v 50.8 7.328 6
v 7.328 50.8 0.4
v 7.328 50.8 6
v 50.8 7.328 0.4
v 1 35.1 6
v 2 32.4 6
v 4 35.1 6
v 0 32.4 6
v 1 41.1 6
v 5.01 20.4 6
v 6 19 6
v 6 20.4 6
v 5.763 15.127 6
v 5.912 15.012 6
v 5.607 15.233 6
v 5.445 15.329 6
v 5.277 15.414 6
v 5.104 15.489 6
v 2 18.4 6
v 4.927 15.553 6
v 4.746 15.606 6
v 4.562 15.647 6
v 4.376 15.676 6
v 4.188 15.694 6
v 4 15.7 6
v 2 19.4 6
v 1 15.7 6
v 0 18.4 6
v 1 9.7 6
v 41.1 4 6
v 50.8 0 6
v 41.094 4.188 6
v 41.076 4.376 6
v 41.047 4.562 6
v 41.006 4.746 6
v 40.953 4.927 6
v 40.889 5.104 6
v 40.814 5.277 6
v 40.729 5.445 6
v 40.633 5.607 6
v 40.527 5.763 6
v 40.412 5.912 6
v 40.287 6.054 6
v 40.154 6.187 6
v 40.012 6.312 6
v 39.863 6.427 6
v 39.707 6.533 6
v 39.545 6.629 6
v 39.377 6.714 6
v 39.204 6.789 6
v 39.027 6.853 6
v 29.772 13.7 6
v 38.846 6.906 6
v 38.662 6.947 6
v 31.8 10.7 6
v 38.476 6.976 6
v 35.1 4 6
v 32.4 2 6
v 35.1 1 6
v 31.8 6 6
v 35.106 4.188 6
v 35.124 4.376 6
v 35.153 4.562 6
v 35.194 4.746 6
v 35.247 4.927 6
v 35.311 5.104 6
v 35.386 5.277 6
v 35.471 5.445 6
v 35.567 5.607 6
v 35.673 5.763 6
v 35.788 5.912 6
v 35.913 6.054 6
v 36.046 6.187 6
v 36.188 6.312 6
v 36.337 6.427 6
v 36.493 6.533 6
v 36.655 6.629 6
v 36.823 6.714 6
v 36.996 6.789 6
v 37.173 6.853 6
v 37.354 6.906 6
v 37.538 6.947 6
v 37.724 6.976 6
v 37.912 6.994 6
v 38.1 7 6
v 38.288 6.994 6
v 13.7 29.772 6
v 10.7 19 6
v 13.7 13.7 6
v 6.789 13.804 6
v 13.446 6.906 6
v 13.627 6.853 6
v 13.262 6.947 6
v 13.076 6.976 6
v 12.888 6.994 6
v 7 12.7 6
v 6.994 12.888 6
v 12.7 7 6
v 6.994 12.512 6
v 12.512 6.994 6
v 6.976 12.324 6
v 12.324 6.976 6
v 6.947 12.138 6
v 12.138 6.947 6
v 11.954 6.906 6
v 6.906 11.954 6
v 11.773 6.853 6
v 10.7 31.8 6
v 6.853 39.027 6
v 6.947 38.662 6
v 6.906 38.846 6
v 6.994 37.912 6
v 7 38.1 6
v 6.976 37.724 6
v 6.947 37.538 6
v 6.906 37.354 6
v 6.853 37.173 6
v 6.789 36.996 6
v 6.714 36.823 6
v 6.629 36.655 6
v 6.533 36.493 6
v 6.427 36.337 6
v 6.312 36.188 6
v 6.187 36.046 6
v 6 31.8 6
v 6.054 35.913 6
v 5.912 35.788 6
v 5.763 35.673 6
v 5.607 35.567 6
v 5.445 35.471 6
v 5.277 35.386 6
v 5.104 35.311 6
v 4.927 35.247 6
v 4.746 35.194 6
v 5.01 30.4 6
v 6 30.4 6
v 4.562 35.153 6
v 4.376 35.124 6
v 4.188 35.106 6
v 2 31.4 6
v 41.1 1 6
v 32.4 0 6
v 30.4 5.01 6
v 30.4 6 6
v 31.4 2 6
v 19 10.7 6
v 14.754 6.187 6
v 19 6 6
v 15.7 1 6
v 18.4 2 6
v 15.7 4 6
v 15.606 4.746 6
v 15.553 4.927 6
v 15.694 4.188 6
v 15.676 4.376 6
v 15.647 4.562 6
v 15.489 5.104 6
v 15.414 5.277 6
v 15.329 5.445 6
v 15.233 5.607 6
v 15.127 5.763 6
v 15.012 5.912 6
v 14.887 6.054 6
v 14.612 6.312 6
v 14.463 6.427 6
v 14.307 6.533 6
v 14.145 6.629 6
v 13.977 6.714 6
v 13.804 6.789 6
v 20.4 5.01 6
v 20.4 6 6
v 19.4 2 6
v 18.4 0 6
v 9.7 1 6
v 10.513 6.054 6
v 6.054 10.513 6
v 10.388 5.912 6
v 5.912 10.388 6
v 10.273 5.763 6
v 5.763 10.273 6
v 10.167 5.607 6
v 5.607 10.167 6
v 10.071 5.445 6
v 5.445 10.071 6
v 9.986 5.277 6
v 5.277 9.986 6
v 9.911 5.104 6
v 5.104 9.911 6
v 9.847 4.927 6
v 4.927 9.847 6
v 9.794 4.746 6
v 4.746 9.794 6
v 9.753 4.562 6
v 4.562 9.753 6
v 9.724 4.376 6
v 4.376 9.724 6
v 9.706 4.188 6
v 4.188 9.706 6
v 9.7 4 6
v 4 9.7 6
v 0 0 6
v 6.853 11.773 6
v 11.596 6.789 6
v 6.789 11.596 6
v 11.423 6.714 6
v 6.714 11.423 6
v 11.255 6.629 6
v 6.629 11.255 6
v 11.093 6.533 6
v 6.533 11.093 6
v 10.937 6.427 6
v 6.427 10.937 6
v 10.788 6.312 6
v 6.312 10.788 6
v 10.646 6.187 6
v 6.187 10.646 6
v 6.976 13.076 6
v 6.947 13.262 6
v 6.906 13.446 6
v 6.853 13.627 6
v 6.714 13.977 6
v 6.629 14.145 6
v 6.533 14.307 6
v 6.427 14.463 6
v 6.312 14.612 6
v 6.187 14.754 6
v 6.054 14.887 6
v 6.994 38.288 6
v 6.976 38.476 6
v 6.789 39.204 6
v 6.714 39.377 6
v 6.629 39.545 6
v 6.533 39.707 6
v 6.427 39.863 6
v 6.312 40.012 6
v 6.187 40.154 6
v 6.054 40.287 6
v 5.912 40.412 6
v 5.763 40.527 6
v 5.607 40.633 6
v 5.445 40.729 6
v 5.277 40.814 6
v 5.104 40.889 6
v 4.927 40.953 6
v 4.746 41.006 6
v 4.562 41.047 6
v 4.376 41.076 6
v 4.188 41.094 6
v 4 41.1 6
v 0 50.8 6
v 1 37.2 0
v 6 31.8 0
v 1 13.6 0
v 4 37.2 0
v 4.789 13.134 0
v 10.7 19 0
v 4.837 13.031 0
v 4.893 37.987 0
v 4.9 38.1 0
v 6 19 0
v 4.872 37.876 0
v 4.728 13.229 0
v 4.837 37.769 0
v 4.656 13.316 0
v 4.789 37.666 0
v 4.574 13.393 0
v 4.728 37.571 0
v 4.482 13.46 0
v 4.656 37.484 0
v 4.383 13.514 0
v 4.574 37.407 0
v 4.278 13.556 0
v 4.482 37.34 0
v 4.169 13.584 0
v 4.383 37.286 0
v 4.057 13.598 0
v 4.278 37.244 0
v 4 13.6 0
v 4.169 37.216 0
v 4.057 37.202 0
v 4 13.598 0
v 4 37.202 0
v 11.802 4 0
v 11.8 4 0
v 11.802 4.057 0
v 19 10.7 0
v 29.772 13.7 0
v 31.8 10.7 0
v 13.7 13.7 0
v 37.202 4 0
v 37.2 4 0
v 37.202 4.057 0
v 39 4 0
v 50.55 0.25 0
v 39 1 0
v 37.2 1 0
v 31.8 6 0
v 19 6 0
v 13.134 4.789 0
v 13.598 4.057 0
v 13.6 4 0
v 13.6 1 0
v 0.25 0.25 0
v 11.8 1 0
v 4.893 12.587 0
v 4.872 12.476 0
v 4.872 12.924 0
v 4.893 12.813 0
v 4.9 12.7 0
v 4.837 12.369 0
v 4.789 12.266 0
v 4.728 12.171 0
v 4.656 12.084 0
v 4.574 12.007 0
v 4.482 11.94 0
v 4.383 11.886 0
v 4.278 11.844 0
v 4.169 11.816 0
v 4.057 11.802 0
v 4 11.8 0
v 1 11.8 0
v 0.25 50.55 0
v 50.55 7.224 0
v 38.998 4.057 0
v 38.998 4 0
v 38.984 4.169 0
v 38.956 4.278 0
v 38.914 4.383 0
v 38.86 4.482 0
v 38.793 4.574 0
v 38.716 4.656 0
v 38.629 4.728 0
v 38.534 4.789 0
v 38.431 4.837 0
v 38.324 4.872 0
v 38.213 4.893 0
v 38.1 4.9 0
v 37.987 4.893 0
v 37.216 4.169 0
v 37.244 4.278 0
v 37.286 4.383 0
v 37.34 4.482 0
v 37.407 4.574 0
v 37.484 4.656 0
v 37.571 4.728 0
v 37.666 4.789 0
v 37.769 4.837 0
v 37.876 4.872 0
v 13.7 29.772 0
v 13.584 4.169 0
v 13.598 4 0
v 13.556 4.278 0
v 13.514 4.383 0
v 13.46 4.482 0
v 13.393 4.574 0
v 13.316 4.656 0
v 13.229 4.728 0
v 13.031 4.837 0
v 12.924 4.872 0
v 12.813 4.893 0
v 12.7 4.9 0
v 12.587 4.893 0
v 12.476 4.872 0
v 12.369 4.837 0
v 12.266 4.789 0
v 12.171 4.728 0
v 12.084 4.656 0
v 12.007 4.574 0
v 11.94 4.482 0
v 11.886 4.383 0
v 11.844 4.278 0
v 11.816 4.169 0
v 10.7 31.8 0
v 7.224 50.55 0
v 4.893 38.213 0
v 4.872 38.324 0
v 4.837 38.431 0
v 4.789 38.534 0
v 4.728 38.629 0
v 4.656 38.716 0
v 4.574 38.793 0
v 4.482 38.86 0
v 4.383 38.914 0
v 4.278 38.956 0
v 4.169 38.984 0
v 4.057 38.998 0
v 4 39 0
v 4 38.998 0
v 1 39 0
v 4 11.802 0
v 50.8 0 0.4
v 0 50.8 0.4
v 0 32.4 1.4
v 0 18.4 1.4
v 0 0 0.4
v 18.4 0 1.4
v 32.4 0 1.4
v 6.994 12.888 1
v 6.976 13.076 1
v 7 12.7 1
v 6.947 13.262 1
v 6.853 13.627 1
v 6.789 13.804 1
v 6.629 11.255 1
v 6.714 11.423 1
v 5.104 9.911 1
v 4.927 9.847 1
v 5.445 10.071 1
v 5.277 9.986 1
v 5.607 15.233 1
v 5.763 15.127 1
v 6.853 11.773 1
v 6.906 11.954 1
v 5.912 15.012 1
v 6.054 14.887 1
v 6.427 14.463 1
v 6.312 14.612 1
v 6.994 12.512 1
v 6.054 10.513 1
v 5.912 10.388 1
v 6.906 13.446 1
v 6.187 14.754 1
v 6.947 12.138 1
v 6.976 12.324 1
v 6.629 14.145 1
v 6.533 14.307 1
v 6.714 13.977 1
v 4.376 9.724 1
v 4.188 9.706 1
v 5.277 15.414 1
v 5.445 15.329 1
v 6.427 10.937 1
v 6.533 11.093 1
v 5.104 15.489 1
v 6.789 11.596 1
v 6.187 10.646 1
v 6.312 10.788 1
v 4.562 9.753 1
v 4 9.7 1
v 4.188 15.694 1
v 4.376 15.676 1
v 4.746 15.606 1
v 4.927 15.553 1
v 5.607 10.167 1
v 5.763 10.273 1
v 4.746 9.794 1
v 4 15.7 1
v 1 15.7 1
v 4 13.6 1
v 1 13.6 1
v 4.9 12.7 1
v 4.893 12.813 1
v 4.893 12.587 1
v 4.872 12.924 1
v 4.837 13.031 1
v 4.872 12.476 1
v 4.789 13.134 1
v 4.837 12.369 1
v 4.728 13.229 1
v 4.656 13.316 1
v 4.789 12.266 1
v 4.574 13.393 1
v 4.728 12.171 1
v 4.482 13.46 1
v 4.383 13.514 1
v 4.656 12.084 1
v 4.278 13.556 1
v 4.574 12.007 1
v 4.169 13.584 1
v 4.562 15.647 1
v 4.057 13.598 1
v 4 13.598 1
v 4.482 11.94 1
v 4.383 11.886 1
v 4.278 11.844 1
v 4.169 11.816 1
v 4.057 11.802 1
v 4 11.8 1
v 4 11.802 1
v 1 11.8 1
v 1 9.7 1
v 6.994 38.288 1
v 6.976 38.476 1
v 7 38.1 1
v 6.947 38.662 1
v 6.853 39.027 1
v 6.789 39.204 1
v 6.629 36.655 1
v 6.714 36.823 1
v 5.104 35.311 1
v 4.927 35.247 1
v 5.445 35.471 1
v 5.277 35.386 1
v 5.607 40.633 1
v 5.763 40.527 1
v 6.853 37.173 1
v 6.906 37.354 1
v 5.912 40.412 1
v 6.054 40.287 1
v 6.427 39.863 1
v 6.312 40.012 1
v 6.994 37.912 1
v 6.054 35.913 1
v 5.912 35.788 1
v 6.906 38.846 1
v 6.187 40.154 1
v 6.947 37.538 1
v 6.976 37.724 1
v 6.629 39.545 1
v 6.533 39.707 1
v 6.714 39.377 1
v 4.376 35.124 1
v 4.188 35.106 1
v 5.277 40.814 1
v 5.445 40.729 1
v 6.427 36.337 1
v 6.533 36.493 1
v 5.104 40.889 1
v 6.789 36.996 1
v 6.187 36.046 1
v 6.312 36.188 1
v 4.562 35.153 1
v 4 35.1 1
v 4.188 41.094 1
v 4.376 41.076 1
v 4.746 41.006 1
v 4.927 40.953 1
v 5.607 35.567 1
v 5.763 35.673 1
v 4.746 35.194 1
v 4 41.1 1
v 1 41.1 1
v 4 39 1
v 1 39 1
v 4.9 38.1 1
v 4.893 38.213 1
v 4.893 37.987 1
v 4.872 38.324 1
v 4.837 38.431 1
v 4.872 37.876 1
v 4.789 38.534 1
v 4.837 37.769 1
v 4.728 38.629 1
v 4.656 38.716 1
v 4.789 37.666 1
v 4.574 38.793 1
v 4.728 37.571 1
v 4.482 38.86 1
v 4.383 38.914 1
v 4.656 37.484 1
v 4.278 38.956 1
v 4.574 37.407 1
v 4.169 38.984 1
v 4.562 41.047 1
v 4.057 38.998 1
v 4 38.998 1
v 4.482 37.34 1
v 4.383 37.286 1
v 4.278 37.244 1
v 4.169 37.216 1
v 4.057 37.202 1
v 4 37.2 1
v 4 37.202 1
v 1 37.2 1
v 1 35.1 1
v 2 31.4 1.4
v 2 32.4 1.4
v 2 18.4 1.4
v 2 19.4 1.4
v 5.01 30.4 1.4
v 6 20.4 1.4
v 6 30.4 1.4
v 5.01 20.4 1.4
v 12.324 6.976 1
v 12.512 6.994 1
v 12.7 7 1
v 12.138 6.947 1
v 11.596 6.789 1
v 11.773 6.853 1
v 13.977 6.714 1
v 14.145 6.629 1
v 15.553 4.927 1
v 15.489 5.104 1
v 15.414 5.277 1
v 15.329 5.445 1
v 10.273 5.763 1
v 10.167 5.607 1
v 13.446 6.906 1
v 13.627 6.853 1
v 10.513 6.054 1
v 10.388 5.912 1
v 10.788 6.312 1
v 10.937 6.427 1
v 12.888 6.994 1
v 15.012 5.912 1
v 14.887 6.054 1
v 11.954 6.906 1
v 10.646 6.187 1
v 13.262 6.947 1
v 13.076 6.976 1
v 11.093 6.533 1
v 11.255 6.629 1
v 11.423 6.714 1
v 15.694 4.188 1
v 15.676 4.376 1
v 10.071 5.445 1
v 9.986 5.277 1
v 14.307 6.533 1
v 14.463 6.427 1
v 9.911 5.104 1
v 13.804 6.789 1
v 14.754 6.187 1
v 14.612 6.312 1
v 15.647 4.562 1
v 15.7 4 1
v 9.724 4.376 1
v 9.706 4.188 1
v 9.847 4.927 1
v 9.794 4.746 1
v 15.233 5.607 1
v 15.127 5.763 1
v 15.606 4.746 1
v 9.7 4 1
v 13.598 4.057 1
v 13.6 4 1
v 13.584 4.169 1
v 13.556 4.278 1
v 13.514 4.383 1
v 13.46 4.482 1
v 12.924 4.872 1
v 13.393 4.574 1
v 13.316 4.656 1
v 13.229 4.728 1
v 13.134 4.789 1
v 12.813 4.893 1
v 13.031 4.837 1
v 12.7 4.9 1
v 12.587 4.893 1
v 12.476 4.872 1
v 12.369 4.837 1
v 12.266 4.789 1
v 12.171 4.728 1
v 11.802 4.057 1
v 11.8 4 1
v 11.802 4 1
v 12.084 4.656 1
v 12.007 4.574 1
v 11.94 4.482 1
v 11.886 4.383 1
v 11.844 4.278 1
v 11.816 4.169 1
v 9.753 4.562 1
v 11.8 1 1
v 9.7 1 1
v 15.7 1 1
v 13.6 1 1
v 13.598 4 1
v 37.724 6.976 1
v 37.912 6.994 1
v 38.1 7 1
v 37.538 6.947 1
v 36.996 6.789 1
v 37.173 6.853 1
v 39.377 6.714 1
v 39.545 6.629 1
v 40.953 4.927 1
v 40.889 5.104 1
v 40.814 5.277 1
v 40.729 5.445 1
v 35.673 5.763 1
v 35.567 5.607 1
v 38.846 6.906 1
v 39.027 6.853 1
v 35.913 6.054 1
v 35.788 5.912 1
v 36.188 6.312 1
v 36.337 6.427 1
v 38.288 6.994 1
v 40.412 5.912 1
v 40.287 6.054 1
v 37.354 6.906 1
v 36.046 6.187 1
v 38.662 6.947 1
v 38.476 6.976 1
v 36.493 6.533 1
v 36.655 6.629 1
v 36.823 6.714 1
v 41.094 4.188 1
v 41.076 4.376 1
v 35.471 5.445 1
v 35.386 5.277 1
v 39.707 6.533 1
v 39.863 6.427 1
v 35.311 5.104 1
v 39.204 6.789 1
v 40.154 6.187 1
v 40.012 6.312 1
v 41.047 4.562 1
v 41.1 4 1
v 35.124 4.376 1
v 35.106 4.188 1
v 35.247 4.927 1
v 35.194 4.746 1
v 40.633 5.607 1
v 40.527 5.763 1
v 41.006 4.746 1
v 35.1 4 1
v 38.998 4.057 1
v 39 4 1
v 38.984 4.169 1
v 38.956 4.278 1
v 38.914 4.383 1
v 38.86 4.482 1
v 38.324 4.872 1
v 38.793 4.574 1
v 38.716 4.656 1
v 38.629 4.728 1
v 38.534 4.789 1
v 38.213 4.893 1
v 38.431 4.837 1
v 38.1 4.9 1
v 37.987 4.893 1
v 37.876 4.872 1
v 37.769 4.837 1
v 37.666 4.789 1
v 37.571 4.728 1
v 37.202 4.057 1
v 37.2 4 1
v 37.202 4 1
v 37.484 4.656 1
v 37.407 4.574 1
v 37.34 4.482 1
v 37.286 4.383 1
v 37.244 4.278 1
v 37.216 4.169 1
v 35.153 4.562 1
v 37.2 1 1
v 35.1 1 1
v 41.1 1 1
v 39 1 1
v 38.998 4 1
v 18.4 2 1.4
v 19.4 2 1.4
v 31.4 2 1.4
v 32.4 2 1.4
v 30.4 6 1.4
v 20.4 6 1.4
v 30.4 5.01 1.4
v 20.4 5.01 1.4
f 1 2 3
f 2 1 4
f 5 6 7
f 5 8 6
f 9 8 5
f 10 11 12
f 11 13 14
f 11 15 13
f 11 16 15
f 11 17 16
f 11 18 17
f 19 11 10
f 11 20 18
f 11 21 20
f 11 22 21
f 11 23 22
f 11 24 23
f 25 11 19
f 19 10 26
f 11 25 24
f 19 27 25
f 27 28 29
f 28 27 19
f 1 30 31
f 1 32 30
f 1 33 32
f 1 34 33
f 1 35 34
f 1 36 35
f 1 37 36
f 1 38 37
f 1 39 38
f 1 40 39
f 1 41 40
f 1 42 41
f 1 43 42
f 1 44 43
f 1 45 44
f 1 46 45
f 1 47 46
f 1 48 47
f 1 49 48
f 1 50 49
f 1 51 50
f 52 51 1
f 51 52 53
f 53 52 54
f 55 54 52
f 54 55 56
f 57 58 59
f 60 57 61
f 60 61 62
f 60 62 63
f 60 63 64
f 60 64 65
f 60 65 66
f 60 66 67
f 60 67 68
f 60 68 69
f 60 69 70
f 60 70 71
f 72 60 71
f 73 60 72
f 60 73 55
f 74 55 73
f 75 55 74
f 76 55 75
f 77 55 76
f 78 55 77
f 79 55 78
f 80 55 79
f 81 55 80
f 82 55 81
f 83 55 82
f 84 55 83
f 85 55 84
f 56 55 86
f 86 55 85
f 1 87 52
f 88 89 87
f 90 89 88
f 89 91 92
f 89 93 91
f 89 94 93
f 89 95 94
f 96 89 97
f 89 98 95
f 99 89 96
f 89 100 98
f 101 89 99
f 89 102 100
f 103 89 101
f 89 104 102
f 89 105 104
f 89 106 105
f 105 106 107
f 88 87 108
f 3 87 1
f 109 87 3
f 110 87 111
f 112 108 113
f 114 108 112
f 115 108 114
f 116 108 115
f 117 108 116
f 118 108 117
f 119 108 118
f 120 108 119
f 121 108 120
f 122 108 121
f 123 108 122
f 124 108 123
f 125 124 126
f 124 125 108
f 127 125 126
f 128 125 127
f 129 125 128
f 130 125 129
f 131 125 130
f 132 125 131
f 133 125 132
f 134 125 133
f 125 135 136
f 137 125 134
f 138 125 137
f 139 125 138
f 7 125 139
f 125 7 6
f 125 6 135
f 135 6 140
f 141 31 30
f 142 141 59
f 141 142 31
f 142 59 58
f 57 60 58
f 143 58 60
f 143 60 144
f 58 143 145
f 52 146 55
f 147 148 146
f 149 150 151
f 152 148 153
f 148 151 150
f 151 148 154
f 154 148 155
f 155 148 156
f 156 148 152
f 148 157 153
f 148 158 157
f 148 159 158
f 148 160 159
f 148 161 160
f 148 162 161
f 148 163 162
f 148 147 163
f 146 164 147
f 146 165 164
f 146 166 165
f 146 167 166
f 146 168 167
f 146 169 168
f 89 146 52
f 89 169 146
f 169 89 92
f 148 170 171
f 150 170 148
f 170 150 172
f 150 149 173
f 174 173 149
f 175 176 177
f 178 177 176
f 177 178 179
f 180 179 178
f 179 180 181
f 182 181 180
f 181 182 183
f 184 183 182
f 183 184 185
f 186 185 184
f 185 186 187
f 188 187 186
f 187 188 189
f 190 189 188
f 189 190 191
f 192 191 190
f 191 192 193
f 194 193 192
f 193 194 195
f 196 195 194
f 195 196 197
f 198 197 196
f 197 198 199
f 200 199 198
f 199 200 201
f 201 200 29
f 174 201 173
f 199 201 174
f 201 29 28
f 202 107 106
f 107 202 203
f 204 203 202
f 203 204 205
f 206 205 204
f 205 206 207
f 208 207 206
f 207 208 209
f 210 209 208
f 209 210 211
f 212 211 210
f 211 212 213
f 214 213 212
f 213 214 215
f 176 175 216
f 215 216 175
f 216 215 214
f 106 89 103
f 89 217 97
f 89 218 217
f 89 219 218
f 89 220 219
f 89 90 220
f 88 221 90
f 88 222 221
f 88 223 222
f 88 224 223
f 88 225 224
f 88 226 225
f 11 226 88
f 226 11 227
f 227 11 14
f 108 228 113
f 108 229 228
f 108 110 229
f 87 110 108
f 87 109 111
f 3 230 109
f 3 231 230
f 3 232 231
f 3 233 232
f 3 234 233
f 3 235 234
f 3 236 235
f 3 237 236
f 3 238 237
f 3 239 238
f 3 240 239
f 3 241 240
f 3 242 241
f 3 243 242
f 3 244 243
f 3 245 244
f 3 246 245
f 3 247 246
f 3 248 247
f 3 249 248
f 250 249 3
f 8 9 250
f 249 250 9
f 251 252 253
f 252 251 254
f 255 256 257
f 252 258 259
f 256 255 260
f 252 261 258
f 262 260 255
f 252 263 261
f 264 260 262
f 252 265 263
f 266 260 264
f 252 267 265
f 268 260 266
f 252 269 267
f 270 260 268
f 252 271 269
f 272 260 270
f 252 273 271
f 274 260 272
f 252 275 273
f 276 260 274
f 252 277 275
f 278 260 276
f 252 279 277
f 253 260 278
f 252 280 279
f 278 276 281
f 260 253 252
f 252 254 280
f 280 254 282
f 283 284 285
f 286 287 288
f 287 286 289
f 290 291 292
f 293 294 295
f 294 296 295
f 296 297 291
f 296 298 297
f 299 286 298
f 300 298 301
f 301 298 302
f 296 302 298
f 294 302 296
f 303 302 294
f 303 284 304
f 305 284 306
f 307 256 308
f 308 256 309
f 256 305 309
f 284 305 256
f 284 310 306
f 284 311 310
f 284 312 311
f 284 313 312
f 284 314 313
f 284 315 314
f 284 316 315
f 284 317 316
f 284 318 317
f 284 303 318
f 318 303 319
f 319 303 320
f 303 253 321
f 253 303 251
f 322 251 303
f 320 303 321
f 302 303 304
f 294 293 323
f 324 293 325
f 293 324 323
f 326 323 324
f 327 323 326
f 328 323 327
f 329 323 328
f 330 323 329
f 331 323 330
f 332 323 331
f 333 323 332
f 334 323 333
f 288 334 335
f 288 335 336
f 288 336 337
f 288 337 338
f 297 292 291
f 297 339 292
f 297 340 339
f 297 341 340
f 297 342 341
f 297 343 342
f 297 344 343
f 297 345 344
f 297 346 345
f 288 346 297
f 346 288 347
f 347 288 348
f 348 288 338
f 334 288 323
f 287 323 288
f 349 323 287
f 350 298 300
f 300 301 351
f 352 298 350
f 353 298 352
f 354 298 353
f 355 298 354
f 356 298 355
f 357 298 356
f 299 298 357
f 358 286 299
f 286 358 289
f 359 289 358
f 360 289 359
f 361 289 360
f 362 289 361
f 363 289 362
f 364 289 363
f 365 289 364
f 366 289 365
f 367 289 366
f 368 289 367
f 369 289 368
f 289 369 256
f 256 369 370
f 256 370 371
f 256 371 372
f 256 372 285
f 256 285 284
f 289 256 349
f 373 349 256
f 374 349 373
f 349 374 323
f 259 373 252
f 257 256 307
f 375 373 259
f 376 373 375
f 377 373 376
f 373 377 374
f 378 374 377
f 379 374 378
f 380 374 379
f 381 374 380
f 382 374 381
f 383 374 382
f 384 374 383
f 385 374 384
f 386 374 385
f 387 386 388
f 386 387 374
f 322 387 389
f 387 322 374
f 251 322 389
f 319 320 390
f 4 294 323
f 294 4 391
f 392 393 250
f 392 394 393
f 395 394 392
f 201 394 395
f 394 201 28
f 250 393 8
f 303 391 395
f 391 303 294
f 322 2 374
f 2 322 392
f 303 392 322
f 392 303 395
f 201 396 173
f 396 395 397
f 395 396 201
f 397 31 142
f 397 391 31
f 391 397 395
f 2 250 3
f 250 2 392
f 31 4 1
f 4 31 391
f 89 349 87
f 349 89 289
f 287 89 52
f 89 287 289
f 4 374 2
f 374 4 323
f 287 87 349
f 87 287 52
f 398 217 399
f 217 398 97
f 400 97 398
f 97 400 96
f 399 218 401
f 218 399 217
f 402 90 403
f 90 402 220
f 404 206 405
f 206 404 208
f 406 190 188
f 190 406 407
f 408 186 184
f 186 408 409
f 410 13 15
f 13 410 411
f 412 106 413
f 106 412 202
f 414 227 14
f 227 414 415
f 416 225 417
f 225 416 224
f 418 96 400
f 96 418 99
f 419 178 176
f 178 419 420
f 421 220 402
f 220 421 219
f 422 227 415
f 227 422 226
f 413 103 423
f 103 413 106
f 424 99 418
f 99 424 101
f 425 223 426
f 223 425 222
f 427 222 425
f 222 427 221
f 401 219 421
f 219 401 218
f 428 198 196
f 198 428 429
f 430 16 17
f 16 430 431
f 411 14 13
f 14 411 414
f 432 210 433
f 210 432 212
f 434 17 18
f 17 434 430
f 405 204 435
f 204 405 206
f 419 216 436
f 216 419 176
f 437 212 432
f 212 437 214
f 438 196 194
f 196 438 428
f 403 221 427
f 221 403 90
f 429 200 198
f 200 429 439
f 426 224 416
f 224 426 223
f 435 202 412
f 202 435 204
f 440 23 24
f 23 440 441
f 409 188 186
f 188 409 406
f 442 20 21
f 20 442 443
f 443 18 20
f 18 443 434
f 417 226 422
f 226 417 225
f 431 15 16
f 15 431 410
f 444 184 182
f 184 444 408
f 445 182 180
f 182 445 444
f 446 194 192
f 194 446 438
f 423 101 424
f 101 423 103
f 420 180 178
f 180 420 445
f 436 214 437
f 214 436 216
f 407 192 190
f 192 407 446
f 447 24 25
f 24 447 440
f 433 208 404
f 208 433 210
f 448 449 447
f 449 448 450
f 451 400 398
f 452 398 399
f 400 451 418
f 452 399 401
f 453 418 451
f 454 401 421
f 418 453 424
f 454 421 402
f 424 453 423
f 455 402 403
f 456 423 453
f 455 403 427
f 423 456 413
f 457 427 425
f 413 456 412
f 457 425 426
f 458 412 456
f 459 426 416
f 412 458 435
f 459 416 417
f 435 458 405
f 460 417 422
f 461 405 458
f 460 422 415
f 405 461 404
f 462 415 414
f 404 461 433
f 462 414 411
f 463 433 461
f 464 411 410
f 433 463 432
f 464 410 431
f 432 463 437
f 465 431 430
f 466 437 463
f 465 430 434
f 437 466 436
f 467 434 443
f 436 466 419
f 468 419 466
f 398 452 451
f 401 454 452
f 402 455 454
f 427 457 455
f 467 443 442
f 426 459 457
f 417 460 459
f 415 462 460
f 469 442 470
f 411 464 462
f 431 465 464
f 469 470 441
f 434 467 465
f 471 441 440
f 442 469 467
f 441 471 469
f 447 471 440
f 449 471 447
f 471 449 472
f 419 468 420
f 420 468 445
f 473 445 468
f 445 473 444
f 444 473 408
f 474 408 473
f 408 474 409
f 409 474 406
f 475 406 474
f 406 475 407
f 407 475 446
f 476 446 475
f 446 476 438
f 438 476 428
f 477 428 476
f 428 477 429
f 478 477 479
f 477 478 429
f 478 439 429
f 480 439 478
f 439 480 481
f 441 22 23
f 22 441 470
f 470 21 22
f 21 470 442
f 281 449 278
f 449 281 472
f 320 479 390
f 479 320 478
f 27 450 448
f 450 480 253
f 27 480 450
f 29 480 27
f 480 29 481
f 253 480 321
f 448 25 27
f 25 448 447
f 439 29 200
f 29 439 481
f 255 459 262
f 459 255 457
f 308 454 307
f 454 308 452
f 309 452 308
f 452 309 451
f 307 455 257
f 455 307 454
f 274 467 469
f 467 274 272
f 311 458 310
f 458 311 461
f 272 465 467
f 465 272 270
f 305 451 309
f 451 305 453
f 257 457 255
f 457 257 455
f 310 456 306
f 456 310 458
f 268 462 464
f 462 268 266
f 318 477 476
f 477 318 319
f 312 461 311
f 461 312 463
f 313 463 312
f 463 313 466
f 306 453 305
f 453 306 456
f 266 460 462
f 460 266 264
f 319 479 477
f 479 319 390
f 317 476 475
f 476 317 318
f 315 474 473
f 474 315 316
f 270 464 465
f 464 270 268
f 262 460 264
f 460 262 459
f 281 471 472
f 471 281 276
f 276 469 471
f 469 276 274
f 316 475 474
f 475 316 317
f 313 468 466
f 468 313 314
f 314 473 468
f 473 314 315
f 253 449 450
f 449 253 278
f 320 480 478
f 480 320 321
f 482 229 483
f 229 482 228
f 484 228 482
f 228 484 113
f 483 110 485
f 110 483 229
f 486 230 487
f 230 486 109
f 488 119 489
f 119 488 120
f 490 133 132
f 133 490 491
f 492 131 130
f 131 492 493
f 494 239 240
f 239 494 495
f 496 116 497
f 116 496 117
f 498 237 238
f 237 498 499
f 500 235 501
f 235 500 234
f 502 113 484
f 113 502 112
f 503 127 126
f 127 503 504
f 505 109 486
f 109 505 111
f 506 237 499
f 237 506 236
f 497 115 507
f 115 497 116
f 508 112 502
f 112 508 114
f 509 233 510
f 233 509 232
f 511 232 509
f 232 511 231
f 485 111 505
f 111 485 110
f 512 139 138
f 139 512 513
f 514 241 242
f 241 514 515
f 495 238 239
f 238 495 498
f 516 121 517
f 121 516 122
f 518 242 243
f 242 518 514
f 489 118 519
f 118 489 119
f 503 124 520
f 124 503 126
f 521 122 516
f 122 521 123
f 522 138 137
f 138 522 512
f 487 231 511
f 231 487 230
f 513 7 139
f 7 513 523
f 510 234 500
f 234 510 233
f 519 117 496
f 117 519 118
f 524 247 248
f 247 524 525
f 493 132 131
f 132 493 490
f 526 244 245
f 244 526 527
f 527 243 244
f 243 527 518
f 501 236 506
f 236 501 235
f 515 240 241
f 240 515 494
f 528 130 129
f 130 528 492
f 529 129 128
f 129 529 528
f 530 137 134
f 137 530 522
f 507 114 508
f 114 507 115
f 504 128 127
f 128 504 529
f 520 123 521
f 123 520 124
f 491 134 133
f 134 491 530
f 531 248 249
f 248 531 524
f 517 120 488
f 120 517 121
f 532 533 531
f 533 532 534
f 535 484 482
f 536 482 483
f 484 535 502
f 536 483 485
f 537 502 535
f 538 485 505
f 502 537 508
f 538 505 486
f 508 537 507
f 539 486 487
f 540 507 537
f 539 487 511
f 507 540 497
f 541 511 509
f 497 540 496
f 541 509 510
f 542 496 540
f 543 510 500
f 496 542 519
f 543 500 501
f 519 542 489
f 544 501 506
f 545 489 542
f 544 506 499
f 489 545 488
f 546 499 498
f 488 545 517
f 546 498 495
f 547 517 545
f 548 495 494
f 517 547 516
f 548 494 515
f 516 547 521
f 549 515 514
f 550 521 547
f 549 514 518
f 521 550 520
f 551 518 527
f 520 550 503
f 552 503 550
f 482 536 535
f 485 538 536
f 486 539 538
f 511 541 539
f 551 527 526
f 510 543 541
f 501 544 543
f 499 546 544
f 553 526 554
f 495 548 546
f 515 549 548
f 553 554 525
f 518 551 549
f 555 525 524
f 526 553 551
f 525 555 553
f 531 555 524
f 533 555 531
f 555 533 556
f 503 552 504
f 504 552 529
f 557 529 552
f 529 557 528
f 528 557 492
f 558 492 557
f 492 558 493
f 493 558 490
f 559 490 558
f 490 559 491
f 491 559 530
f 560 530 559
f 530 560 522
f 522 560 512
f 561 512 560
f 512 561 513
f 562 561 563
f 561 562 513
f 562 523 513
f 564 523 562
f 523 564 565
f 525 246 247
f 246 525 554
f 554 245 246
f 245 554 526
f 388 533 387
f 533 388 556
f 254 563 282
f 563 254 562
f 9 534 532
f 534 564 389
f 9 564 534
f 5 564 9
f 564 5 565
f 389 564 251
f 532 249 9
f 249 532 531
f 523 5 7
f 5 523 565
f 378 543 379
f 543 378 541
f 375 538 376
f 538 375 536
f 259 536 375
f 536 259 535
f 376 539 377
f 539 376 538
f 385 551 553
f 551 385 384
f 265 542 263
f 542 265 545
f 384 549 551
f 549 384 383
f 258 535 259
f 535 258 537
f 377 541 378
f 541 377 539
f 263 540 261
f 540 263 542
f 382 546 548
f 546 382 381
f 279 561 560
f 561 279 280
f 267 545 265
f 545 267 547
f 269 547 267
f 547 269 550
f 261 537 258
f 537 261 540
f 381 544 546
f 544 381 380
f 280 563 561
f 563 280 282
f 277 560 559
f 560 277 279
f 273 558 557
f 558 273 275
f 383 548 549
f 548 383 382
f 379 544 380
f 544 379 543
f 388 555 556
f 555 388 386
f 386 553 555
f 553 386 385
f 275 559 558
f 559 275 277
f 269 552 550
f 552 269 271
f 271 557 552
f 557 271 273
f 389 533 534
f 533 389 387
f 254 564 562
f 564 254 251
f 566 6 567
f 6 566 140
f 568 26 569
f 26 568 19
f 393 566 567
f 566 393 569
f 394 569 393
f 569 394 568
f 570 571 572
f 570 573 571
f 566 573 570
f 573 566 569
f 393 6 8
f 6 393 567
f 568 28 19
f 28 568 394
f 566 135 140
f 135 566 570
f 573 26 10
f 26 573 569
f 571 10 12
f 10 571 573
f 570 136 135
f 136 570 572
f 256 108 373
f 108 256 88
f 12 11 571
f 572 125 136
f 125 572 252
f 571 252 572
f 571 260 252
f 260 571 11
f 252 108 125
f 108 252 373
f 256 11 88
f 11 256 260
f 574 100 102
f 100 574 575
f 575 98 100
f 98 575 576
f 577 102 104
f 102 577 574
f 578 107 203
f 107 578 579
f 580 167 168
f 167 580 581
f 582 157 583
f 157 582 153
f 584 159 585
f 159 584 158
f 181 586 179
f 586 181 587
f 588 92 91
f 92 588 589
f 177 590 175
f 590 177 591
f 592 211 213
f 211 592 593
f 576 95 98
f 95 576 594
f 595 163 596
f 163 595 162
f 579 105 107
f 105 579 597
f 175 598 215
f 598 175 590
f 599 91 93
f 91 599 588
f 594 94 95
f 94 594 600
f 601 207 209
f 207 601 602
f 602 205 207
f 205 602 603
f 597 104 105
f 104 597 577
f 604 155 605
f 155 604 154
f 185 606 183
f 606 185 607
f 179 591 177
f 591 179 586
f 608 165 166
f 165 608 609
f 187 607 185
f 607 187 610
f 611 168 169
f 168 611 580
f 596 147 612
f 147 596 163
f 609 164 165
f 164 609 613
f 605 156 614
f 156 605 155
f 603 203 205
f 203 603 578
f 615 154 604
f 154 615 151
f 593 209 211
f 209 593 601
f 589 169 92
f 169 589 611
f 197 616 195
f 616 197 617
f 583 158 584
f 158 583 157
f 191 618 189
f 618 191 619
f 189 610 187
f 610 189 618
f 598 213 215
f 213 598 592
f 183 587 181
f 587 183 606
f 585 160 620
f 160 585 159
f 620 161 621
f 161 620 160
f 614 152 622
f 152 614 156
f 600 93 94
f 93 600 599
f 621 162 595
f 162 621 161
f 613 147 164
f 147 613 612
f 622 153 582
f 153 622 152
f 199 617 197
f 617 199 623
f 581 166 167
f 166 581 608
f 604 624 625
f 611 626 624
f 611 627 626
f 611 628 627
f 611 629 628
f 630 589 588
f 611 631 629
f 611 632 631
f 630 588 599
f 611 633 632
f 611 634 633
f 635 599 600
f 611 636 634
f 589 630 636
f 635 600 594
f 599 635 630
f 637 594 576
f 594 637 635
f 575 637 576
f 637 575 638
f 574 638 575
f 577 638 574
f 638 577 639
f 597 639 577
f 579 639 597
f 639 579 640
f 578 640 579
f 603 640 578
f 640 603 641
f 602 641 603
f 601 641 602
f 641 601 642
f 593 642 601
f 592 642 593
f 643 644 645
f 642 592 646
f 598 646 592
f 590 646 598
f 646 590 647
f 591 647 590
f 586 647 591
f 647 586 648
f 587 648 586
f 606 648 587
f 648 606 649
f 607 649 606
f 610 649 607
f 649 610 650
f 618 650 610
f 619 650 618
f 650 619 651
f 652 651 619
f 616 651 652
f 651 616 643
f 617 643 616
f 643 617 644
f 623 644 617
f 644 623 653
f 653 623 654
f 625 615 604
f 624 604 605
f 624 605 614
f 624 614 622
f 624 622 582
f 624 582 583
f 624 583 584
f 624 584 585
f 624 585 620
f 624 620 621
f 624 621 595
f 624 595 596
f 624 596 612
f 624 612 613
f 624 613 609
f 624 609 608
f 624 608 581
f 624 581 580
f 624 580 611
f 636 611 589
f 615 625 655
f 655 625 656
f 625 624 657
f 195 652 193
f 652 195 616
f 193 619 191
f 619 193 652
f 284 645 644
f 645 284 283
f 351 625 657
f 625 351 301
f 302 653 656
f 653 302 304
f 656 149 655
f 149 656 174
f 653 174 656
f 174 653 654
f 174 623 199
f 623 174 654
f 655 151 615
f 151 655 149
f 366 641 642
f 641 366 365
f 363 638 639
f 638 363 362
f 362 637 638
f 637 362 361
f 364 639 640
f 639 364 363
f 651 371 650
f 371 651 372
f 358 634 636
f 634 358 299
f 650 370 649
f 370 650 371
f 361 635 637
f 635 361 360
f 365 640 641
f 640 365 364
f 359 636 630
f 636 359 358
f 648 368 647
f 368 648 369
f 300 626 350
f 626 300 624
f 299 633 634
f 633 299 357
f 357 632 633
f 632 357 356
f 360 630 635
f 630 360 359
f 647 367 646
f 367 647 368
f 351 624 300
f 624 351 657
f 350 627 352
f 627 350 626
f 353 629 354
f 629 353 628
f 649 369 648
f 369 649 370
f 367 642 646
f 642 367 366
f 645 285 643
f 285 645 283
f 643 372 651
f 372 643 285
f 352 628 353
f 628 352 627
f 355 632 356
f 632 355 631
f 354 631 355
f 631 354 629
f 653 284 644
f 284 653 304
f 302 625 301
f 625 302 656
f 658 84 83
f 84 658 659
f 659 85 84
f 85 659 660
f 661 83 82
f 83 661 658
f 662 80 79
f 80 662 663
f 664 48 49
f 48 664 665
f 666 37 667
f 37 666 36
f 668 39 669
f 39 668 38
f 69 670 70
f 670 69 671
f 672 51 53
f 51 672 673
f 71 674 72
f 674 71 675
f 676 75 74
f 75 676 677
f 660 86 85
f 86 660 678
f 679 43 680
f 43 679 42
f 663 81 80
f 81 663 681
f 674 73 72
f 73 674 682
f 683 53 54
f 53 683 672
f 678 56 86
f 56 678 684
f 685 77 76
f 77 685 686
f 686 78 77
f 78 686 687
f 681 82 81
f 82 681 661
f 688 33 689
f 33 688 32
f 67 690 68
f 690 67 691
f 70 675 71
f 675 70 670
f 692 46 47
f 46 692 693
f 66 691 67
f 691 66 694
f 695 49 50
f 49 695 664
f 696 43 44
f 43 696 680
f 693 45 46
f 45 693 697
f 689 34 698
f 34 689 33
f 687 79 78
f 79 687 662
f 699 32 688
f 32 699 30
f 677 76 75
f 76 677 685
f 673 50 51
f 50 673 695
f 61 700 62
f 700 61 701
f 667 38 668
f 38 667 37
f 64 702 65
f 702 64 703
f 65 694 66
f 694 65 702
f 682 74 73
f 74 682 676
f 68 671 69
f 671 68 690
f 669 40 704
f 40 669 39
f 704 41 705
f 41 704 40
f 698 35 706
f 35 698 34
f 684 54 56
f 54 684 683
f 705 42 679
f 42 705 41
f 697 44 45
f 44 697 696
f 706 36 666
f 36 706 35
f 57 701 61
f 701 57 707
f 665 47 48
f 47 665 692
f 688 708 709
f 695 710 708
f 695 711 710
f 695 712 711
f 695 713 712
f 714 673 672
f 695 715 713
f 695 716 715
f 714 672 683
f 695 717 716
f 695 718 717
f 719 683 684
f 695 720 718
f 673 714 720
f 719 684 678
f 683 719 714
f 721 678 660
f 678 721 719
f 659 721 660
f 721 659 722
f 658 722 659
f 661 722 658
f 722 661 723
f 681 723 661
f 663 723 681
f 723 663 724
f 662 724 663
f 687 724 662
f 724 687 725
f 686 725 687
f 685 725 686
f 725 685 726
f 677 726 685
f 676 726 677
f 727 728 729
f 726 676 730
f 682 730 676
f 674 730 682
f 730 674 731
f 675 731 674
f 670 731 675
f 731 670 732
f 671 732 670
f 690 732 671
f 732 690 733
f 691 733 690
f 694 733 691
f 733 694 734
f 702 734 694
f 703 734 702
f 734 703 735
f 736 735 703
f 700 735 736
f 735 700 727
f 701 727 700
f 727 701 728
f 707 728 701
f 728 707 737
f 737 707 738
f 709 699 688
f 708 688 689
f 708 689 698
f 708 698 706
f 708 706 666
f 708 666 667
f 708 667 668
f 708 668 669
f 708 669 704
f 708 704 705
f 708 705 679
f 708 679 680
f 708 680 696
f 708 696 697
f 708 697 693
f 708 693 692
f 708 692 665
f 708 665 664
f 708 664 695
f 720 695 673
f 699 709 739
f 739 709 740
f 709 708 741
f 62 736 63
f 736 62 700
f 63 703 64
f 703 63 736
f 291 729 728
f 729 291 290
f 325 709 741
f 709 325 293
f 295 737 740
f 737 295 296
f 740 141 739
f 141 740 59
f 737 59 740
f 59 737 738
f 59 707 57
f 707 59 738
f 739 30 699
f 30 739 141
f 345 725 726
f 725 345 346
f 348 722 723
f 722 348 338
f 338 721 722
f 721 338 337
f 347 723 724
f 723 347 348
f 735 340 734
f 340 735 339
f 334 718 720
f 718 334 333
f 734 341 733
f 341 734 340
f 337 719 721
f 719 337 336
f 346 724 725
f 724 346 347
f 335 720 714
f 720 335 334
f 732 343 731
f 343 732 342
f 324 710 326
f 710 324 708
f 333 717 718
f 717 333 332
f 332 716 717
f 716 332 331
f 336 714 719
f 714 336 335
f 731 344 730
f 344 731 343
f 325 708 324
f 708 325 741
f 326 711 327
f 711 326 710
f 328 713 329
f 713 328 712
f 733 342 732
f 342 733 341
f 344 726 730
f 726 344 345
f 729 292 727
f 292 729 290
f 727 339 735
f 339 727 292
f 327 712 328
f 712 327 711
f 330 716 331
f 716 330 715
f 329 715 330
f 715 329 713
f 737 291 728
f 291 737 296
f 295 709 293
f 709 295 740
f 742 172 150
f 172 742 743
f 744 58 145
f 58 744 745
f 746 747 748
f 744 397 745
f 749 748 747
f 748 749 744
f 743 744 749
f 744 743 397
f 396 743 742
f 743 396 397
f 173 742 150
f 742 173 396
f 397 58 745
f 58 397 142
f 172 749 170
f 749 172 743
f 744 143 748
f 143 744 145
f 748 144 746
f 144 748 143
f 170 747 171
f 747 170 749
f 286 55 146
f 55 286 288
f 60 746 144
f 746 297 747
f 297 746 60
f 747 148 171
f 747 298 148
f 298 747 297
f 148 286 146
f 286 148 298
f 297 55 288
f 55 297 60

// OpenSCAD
// file: lock_flex_magnetic.scad
/*
 * Flex Magnet
 */
module flex_magnetic_positive(magnet_hole=6, height=6) {
    if (magnet_hole > 0) {
        translate([magnet_hole/2+1,0,0]) cylinder(.41,magnet_hole/2+1-.25,magnet_hole/2+1, $fn=100);
        translate([magnet_hole/2+1,0,0.4]) cylinder(height-.4,magnet_hole/2+1,magnet_hole/2+1, $fn=100);
        hull() {
            translate([0.25,-magnet_hole/2-1+.25,0]) cube([magnet_hole/2+1-.25,magnet_hole+2-.5,1]);
            translate([0,-magnet_hole/2-1,.4]) cube([magnet_hole/2+1,magnet_hole+2,height-.4]);
        }
    }
}

module flex_magnetic_negative(magnet_hole=6, height=6) {
    if (magnet_hole > 0) {
        translate([magnet_hole/2+1,0,1]) cylinder(height+2,magnet_hole/2,magnet_hole/2, $fn=100);
        translate([1,-magnet_hole/2,1]) cube([magnet_hole/2,magnet_hole,height+2]);
        translate([magnet_hole/2+1,0,-1]) cylinder(10,.9,.9,$fn=50);
        translate([1,-.9,-1]) cube([magnet_hole/2,.9*2,10]);
    }
}

module flex_magnetic_hex(square_basis, magnet_hole=6, height=6) {
    if (magnet_hole > 0) {
        hull() {
            translate([square_basis/2,0,0]) rotate([0,0,90]) translate([magnet_hole/2+1,0,1]) cylinder(height+2,magnet_hole/2,magnet_hole/2, $fn=100);
            rotate([0,0,-120]) mirror([1,0,0]) translate([square_basis/2,0,0]) rotate([0,0,90]) translate([magnet_hole/2+1,0,1]) cylinder(height+2,magnet_hole/2,magnet_hole/2, $fn=100);
        }
        translate([square_basis/2,0,0]) rotate([0,0,90]) union() {
            //translate([magnet_hole/2+1,0,1]) cylinder(8,magnet_hole/2,magnet_hole/2, $fn=100);
            translate([1,-magnet_hole/2,1]) cube([magnet_hole/2,magnet_hole,height+2]);
            translate([magnet_hole/2+1,0,-1]) cylinder(10,.9,.9,$fn=50);
            translate([1,-.9,-1]) cube([magnet_hole/2,.9*2,10]);
        }
        rotate([0,0,-120]) mirror([1,0,0]) translate([square_basis/2,0,0]) rotate([0,0,90]) union() {
            //translate([magnet_hole/2+1,0,1]) cylinder(8,magnet_hole/2,magnet_hole/2, $fn=100);
            translate([1,-magnet_hole/2,1]) cube([magnet_hole/2,magnet_hole,height+2]);
            translate([magnet_hole/2+1,0,-1]) cylinder(10,.9,.9,$fn=50);
            translate([1,-.9,-1]) cube([magnet_hole/2,.9*2,10]);
        }
    }
}
// file: lock_magnetic.scad
/*
 * Magnets
 */
 
module magnetic_positive(magnet_hole=6, height=6) {
    if (magnet_hole > 0) {
        translate([magnet_hole/2+1,0,0]) cylinder(.41,magnet_hole/2+1-.25,magnet_hole/2+1, $fn=100);
        translate([magnet_hole/2+1,0,0.4]) cylinder(height-.4,magnet_hole/2+1,magnet_hole/2+1, $fn=100);
    }
}

module magnetic_negative(magnet_hole=6, height=8) {
    if (magnet_hole > 0) {
        translate([magnet_hole/2+1,0,1]) cylinder(height+2,magnet_hole/2,magnet_hole/2, $fn=100);
        translate([magnet_hole/2+1,0,-1]) cylinder(10,.9,.9,$fn=50);
    }
}
// file: lock_openlock_topless.scad
/*
 * Openlock Topless connection bay
 */

module openlock_topless_chamber(buffer=0, height=6) {
    translate([-buffer,-7,1.4]) cube([2+buffer,7*2,height+1]);
    hull() {
        translate([0,-6,1.4]) cube([2,6*2,height+1]);
        translate([3+0.01,-5,1.4]) cube([2,5*2,height+1]);
    }
    hull() {
        translate([5,-5,1.4]) cube([1,5*2,height+1]);
        translate([6,-5,1.4]) cube([1,5*2,height+1]);
    }
    translate([6,-6.4,-1]) cube([4.7,6.4*2,height+3.4]);
}

module openlock_topless_positive(height=6) {
    translate([0,-8,0.4]) cube([2,16,height-.4]); 
}

module openlock_topless_negative(supports=true, height=6) {
    difference() {
        openlock_topless_chamber(1, height=height);
    }
}
// file: lock_openlock.scad
/*
 * Openlock connection bay
 */

module openlock_chamber(buffer=0) {
    add = TOPLESS == "true" ? 10 : 0;
    translate([-buffer,-7,1.4]) cube([2+buffer,7*2,4.2+add]);
    hull() {
        translate([0,-6,1.4]) cube([2,6*2,4.2+add]);
        translate([3+0.01,-5,1.4]) cube([2,5*2,4.2+add]);
    }
    hull() {
        translate([5,-5,1.4]) cube([1,5*2,4.2+add]);
        translate([6,-5,1.4]) cube([1,5*2,4.7]);
    }
    translate([6,-6.4,-1]) cube([4.7,6.4*2,7.1]);
}

module openlock_supports() {
    module support() {
        translate([-1.1,2.05,1.2]) cube([3.1,1,4.6]);
        hull() {
            translate([-1.1,2.05,1.4]) cube([3.1,1,2.1]);
            translate([-1.1,2.05-.2,1.9]) cube([3.1,1.4,1.1]);
        }
        hull() {
            translate([-1.1,2.05,3.5]) cube([3.1,1,2.1]);
            translate([-1.1,2.05-.2,4.0]) cube([3.1,1.4,1.1]);
        }
    }
    if (TOPLESS != "true") {
        support();
        mirror([0,1,0]) support();
    }
}

module openlock_positive() {
    translate([0,-8,0.4]) cube([2,16,5.6]); 
}

module openlock_negative(supports=true) {
    difference() {
        openlock_chamber(1);
        if(supports) {
            openlock_supports();
        }
    }
}

module openlock_wall_negative(supports=true) {
    translate([0,0,0]) difference() {
        translate([0,0,1.4]) linear_extrude(height=4.2) {
            polygon([
                [-7.35,7],[-5.35,7],[-5.35,6],
                [-2.35,5],[2.35,5],
                [5.35,6],[5.35,7],[7.35,7],
                [7.35,-7],[5.35,-7],[5.35,-6],
                [2.35,-5],[-2.35,-5],
                [-5.35,-6],[-5.35,-7],[-7.35,-7]]);
        }
        if(supports) {
            translate([-6.35,0,0]) openlock_supports();
            rotate([0,0,180]) translate([-6.35,0,0]) openlock_supports();
        }
    }
}

module openlock_wall_positive() {
    translate([-6.35,-8,0.4]) cube([12.7,16,5.6]); 
}

module openlock_sidelock_negative() {
    
    translate([0,0,7]) rotate([90,0,0]) translate([0,0,-2.1]) linear_extrude(height=4.2) {
        polygon([[-1,-7],[-1,7],[2,7],[2,6],[5,5],[5.9,5],[5.9,5.26],[5.9+4.53,5.26],
            [5.9+4.53,-5.26],[5.9,-5.26],[5.9,-5],[5,-5],[2,-6],[2,-7]]);
    }
}

module openlock_sidelock_positive() {
    translate([0,-3.1,-8]) cube([11.43,6.2,16]);
}
// file: lock_infinitylock.scad
/*
 * Infinity Lock connection bay
 */
module infinitylock_positive() {
    translate([0,-6.6,0.4]) cube([2,6.6*2,5.6]); 
}

module infinitylock_negative() {
    translate([-1,-5.6,1.4]) cube([2.6,5.6*2,4.2]);

    hull() {
        translate([0,-3.83,1.4]) cube([1.6,3.83*2,4.2]);
        translate([0,-3.36,1.4]) cube([2.15,3.36*2,4.2]);
    }
    translate([0,-3.36,1.4]) cube([2.8,3.36*2,4.2]);
    hull() {
        translate([2.7,-3.36,1.4]) cube([2.7,3.36*2,4.2]);
        translate([3.84,-3.83,1.4]) cube([1,3.83*2,4.2]);
    }
    translate([4.8,-3.83,-1]) cube([3.44,3.83*2,6.6]);
}
// file: lock_dragonlock.scad
/*
 * Dragonlock connection bay
 */

module dragonlock_interior_a(north=true,south=true,east=true,west=true) {
    module edge() {
        difference() {
            hull() {
                translate([3.17,-12.67,-1]) cube([8.512,12.67*2,6]);
                translate([3.145,-12.7,-1]) cube([8.512,12.67*2,6.206]);
            }
            translate([10.29,-12.8,5.206]) rotate([0,45,0]) cube([8.512,12.8*2,6.206]);
        }
    }
    
    translate([0,25.4,0]) {
        difference() {
            translate([12.7,-12.7,-1]) cube([50.8-12.7*2,50.8-12.7*2,6.206]);
            translate([25.4,0,0]) rotate([0,0,45]) translate([-.75,-30,-2]) cube([1.5,60,20]);
            translate([25.4,0,0]) rotate([0,0,-45]) translate([-.75,-30,-2]) cube([1.5,60,20]);
        }

        if (!west) {
            edge();
        }
        if (!south) {
            translate([25.4,-25.4,0]) rotate([0,0,90]) edge();
        }
        if (!east) {
            translate([50.8,0,0]) rotate([0,0,180]) edge();
        }
        if (!north) {
            translate([25.4,25.4,0]) rotate([0,0,270]) edge();
        }
        dragonlock_nub();
        translate([25.4,-25.4,0]) rotate([0,0,90]) dragonlock_nub();
        translate([50.8,0,0]) rotate([0,0,180]) dragonlock_nub();
        translate([25.4,25.4,0]) rotate([0,0,270]) dragonlock_nub();
    }
}

module dragonlock_interior_b(north=true,south=true,east=true,west=true) {
    translate([0,25.4,0]) {
        if (west) {
            dragonlock_negative();
        }
        if (south) {
            translate([25.4,-25.4,0]) rotate([0,0,90]) dragonlock_negative();
        }
        if (east) {
            translate([50.8,0,0]) rotate([0,0,180]) dragonlock_negative();
        }
        if (north) {
            translate([25.4,25.4,0]) rotate([0,0,270]) dragonlock_negative();
        }
    }
}


module dragonlock_positive() {
    translate([0,-7.8418,0.4]) cube([2,7.8418*2,5.6]);
}

module dragonlock_negative(supports=true) {
    difference() {
        union() {
            translate([-1,-6.8418,1.3695]) cube([5.1,6.8418*2,3.225]);
            hull() {
                translate([3.17,-7.62,-1]) cube([7.9634,7.62*2,4.81]);
                translate([3.17,-7.62,-1]) cube([7.735,7.62*2,5.5945]);
            }
        }
        if(supports) {
            translate([-1.1,-.25,0]) cube([4.262,.5,5]);
            translate([-1.1,3.59-.25,0]) cube([7.1,.5,5]);
            translate([-1.1,-3.59-.25,0]) cube([7.1,.5,5]);
        }
        translate([3,-3.9095,-1.1]) cube([10,3.9095*2,2.4695]);
        translate([3,-4.7685,-1.1]) rotate([0,0,39.15]) cube([5,5,2.4695]);
        mirror([0,1,0]) translate([3,-4.7685,-1.1]) rotate([0,0,39.15]) cube([5,5,2.4695]);
        translate([7,-2.12,-1]) cube([5,2.12*2,10]);
        translate([8.069,0,-1]) cylinder(10,2.815,2.811,$fn=50);

        difference() {
            translate([8.069,0,-1.1]) cylinder(2.4695,4.62,4.62,$fn=50);
            translate([3,-5,-1.2]) cube([10,10,1.2]);
        }
    }
}
// file: impl_square.scad
include <connectors.scad>

/*
 * Connector Positive
 */
module connector_positive_square(x,y,square_basis,edge_width,north=true,south=true,east=true,west=true) {
    for ( i = [0 : y-1] ) {
        if(west) {
            translate([0,square_basis*(i+1)-square_basis/2,0]) center_connector_positive(y);
        }
        if(east) {
            translate([square_basis*x,square_basis*(i+1)-square_basis/2,0]) rotate([0,0,180]) center_connector_positive(y);
        }
    }
    if (y > 1) {
        for ( i = [1 : y-1] ) {
            if(west) {
                translate([0,square_basis*i,0]) joint_connector_positive(y);
            }
            if(east) {
                translate([square_basis*x,square_basis*i,0]) rotate([0,0,180]) joint_connector_positive(y);
            }
        }
    }
    for ( i = [0 : x-1] ) {
        if(south) {
            translate([square_basis*(i+1)-square_basis/2,0,0]) rotate([0,0,90]) center_connector_positive(x);
        }
        if(north) {
            translate([square_basis*(i+1)-square_basis/2,square_basis*y,0]) rotate([0,0,-90]) center_connector_positive(x);
        }
    }
    if (x > 1) {
        for ( i = [1 : x-1] ) {
            if(south) {
                translate([square_basis*i,0,0]) rotate([0,0,90]) joint_connector_positive(y);
            }
            if(north) {
                translate([square_basis*i,square_basis*y,0]) rotate([0,0,-90]) joint_connector_positive(y);
            }
        }
    }
}

module connector_positive_square_notch(x,y,square_basis,edge_width,north=true,south=true,east=true,west=true) {
    if(NOTCH == "true") {
        connector_positive_square(x,y,square_basis,edge_width,north=north,south=false,east=east,west=false);
        if(south) {
            translate([square_basis*NOTCH_X,0,0]) connector_positive_square(x-NOTCH_X,y-NOTCH_Y,square_basis,edge_width,north=false,south=true,east=false,west=false);
            translate([0,square_basis*NOTCH_Y,0]) connector_positive_square(NOTCH_X,NOTCH_Y,square_basis,edge_width,north=false,south=true,east=false,west=false);
        }
        if(west) {
            translate([square_basis*NOTCH_X,0,0]) connector_positive_square(NOTCH_X,NOTCH_Y,square_basis,edge_width,north=false,south=false,east=false,west=true);
            translate([0,square_basis*NOTCH_Y,0]) connector_positive_square(x-NOTCH_X,y-NOTCH_Y,square_basis,edge_width,north=false,south=false,east=false,west=true);
        }
    } else {
        connector_positive_square(x,y,square_basis,edge_width,north,south,east,west);
    }
}

/*
 * Connector Negative
 */
module connector_negative_square(x,y,square_basis,edge_width,north=true,south=true,east=true,west=true, priority=PRIORITY, lock=LOCK, magnets=MAGNETS, magnet_hole=MAGNET_HOLE, height=HEIGHT) {
    for ( i = [0 : y-1] ) {
        if(west) {
            translate([0,square_basis*(i+1)-square_basis/2,0]) center_connector_negative(y, priority, lock, magnets, magnet_hole, height=height);
        }
        if(east) {
            translate([square_basis*x,square_basis*(i+1)-square_basis/2,0]) rotate([0,0,180]) center_connector_negative(y, priority, lock, magnets, magnet_hole, , height=height);
        }
    }
    if (y > 1) {
        for ( i = [0 : ceil(y)-2] ) {
            if(west) {
                translate([0,square_basis*(i+1),0]) joint_connector_negative(y, height=height, lock=lock);
            }
            if(east) {
                translate([square_basis*x,square_basis*(i+1),0]) rotate([0,0,180]) joint_connector_negative(y, height=height, lock=lock);
            }
        }
    }
    for ( i = [0 : x-1] ) {
        if(south) {
            translate([square_basis*(i+1)-square_basis/2,0,0]) rotate([0,0,90]) center_connector_negative(x, priority, lock, magnets, magnet_hole, height=height);
        }
        if(north) {
            translate([square_basis*(i+1)-square_basis/2,square_basis*y,0]) rotate([0,0,-90]) center_connector_negative(x, priority, lock, magnets, magnet_hole, height=height);
        }
    }
    if (x > 1) {
        for ( i = [0 : ceil(x)-2] ) {
            if(south) {
                translate([square_basis*(i+1),0,0]) rotate([0,0,90]) joint_connector_negative(y, height=height, lock=lock);
            }
            if(north) {
                translate([square_basis*(i+1),square_basis*y,0]) rotate([0,0,-90]) joint_connector_negative(y, height=height, lock=lock);
            }
        }
    }
}

module connector_negative_square_notch(x,y,square_basis,edge_width,north=true,south=true,east=true,west=true) {
    if(NOTCH == "true") {
        connector_negative_square(x,y,square_basis,edge_width,north=north,south=false,east=east,west=false);
        if(south) {
            translate([square_basis*NOTCH_X,0,0]) connector_negative_square(x-NOTCH_X,y-NOTCH_Y,square_basis,edge_width,north=false,south=true,east=false,west=false);
            translate([0,square_basis*NOTCH_Y,0]) connector_negative_square(NOTCH_X,NOTCH_Y,square_basis,edge_width,north=false,south=true,east=false,west=false);
        }
        if(west) {
            translate([square_basis*NOTCH_X,0,0]) connector_negative_square(NOTCH_X,NOTCH_Y,square_basis,edge_width,north=false,south=false,east=false,west=true);
            translate([0,square_basis*NOTCH_Y,0]) connector_negative_square(x-NOTCH_X,y-NOTCH_Y,square_basis,edge_width,north=false,south=false,east=false,west=true);
        }
    } else {
        connector_negative_square(x,y,square_basis,edge_width,north,south,east,west);
    }
}

/*
 * Plain base exterior
 */
module plain_square(x,y,square_basis,edge_width) {
    difference() {
        plain_square_positive(x,y,square_basis);
        edge = LOCK == "dragonlock" ? square_basis/2 : edge_width;
        plain_square_negative(x,y,square_basis,edge);
    }
}

module plain_square_positive(x,y,square_basis) {
    difference() {
        hull() {
            translate([0,0,0.4]) cube([square_basis*x, square_basis*y, HEIGHT-.39]);
            translate([0.25,0.25,0]) cube([square_basis*x-.5, square_basis*y-.5, 1]);
        }
        if(NOTCH == "true") {
            translate([-1,-1,-1]) cube([square_basis*NOTCH_X+1, square_basis*NOTCH_Y+1, 8]);
            hull() {
                translate([-1,-1,0]) cube([square_basis*NOTCH_X+1, square_basis*NOTCH_Y+1, .4]);
                translate([-1,-1,-0.01]) cube([square_basis*NOTCH_X+1.25, square_basis*NOTCH_Y+1.25, 0.01]);
            }
        }
    }
}

module plain_square_negative(x,y,square_basis,edge_width) {
    difference() {
        intersection() {
            translate([edge_width,edge_width,0]) translate([1,1,-1]) cube([square_basis*x-((edge_width+1)*2),square_basis*y-((edge_width+1)*2),HEIGHT+2]);
            difference() {
                translate([edge_width,edge_width,0]) translate([1,1,-1]) cube([square_basis*x-((edge_width+1)*2),square_basis*y-((edge_width+1)*2),HEIGHT+2]);
                if(NOTCH == "true") {
                    translate([0,0,0.4]) cube([square_basis*NOTCH_X+edge_width+1, square_basis*NOTCH_Y+edge_width+1, HEIGHT]);
                    translate([0.25,.25,0]) cube([square_basis*NOTCH_X+edge_width+1-.5, square_basis*NOTCH_Y+edge_width+1-.5, .4]);
                }
            }
        }
        if (CENTER == "true") {
            for ( i = [2 : 2 : y-1] ) {
                translate([0,(i-.125)*square_basis,-2]) cube([square_basis*x,square_basis/4,HEIGHT+4]);
            }
            for ( i = [2 : 2 : y-1] ) {
                translate([(i-.125)*square_basis,0,-2]) cube([square_basis/4,square_basis*y,HEIGHT+4]);
            }
        }
    }
}
// main file
/* [Base Tile Size] */
x = 2; //[1,2,3,4,5,6,7,8]
y = 2; //[1,2,3,4,5,6,7,8]

/* [diagonal Basis] */
// What is the size in mm of a diagonal?
DIAGONAL_BASIS = "inch"; // [25mm:Dwarven Forge/Hirstarts, inch:OpenLOCK/Dragonlock/Dungeonworks, wyloch:Wyloch]

/* [Lock] */
// Dragonlock - connector between diagonals, pips on either side for stacking
// InfinityLock - connector between diagonals and in the middle of diagonals
// OpenLOCK - connector between diagonals
// OpenLOCK Triplex - connector between diagonals and in the middle of diagonals
// OpenLOCK Topless - openlock, but without a top
LOCK = "openlock";// [openlock,triplex,infinitylock,dragonlock,none]

/* [Topless] */
// remove top of openlock bays
TOPLESS = "true"; // [true, false]

 /* [Magnets] */
// Use magnets or not.
MAGNETS = "flex_magnetic"; // [magnetic,flex_magnetic,none]
// Size of hole for magnet.  6 works well for 5mm buckyball style magnets.
MAGNET_HOLE = 6;

/* [Electronics] */
// Should this have enough space for electronics.
ELECTRONICS = "false";

/* [Priority] */
// Do you want lock or magnets to win when the two conflict
PRIORITY = "lock"; // [lock,magnets]

/* [Notch Options] */
// Removes a diagonal from the tile of notch_x by notch_y
NOTCH = "false"; // [true,false]
NOTCH_X = 2; // [1,2,3]
NOTCH_Y = 2; // [1,2,3]

CENTER = "false"; // [true, false]

HEIGHT = 6; // 6 is default

include <impl_diagonal.scad>

/*
 * Top Level Function
 */
module base_diagonal(x,y,diagonal_basis) {
    tmp_edge_width = MAGNET_HOLE >= 5.55 ? MAGNET_HOLE + 1 : 6.55;
    electronics = (x <= 2 || y <= 2) && ELECTRONICS == "true";
    edge_width = ((PRIORITY == "lock" && (x == 1 || y == 1)) || LOCK == "triplex" || LOCK == "openlock" && MAGNETS == "none" || LOCK == "openlock_topless" && MAGNETS == "none") || electronics ? tmp_edge_width : diagonal_basis/2 ;
    echo("edge_width: ", edge_width)

    difference() {
        union() {
            plain_diagonal(x,y,diagonal_basis,LOCK,edge_width);
        }
        connector_negative_diagonal_notch(x,y,diagonal_basis,edge_width) ;
    }
}

function keyLookup (data, key) = search(key, data, num_returns_per_match=1)[0];


basis = [
    ["25mm", 25],
    ["inch", 25.4],
    ["wyloch", 31.75]
];
diagonal_basis_number = basis[keyLookup(basis, [DIAGONAL_BASIS])][1];
wall_width = 10.2*diagonal_basis_number/25;
echo("diagonal_basis_number: ", diagonal_basis_number);
echo("wall_width: ", wall_width);

// Compatability
valid_dragonlock_basis = (DIAGONAL_BASIS == "inch");
valid_infinitylock_basis = (DIAGONAL_BASIS == "inch");

if (LOCK == "dragonlock" && !valid_dragonlock_basis) {
    echo("ERROR: dragonlock is only compatible with inch basis");
} else if (LOCK == "infinitylock" && !valid_infinitylock_basis) {
    echo("ERROR: infinitylock is only compatible with inch basis");
} else {
    color("Grey") base_diagonal(x,y,diagonal_basis_number);
}

//plain_base(x,y,diagonal_basis_number,shape,7);
